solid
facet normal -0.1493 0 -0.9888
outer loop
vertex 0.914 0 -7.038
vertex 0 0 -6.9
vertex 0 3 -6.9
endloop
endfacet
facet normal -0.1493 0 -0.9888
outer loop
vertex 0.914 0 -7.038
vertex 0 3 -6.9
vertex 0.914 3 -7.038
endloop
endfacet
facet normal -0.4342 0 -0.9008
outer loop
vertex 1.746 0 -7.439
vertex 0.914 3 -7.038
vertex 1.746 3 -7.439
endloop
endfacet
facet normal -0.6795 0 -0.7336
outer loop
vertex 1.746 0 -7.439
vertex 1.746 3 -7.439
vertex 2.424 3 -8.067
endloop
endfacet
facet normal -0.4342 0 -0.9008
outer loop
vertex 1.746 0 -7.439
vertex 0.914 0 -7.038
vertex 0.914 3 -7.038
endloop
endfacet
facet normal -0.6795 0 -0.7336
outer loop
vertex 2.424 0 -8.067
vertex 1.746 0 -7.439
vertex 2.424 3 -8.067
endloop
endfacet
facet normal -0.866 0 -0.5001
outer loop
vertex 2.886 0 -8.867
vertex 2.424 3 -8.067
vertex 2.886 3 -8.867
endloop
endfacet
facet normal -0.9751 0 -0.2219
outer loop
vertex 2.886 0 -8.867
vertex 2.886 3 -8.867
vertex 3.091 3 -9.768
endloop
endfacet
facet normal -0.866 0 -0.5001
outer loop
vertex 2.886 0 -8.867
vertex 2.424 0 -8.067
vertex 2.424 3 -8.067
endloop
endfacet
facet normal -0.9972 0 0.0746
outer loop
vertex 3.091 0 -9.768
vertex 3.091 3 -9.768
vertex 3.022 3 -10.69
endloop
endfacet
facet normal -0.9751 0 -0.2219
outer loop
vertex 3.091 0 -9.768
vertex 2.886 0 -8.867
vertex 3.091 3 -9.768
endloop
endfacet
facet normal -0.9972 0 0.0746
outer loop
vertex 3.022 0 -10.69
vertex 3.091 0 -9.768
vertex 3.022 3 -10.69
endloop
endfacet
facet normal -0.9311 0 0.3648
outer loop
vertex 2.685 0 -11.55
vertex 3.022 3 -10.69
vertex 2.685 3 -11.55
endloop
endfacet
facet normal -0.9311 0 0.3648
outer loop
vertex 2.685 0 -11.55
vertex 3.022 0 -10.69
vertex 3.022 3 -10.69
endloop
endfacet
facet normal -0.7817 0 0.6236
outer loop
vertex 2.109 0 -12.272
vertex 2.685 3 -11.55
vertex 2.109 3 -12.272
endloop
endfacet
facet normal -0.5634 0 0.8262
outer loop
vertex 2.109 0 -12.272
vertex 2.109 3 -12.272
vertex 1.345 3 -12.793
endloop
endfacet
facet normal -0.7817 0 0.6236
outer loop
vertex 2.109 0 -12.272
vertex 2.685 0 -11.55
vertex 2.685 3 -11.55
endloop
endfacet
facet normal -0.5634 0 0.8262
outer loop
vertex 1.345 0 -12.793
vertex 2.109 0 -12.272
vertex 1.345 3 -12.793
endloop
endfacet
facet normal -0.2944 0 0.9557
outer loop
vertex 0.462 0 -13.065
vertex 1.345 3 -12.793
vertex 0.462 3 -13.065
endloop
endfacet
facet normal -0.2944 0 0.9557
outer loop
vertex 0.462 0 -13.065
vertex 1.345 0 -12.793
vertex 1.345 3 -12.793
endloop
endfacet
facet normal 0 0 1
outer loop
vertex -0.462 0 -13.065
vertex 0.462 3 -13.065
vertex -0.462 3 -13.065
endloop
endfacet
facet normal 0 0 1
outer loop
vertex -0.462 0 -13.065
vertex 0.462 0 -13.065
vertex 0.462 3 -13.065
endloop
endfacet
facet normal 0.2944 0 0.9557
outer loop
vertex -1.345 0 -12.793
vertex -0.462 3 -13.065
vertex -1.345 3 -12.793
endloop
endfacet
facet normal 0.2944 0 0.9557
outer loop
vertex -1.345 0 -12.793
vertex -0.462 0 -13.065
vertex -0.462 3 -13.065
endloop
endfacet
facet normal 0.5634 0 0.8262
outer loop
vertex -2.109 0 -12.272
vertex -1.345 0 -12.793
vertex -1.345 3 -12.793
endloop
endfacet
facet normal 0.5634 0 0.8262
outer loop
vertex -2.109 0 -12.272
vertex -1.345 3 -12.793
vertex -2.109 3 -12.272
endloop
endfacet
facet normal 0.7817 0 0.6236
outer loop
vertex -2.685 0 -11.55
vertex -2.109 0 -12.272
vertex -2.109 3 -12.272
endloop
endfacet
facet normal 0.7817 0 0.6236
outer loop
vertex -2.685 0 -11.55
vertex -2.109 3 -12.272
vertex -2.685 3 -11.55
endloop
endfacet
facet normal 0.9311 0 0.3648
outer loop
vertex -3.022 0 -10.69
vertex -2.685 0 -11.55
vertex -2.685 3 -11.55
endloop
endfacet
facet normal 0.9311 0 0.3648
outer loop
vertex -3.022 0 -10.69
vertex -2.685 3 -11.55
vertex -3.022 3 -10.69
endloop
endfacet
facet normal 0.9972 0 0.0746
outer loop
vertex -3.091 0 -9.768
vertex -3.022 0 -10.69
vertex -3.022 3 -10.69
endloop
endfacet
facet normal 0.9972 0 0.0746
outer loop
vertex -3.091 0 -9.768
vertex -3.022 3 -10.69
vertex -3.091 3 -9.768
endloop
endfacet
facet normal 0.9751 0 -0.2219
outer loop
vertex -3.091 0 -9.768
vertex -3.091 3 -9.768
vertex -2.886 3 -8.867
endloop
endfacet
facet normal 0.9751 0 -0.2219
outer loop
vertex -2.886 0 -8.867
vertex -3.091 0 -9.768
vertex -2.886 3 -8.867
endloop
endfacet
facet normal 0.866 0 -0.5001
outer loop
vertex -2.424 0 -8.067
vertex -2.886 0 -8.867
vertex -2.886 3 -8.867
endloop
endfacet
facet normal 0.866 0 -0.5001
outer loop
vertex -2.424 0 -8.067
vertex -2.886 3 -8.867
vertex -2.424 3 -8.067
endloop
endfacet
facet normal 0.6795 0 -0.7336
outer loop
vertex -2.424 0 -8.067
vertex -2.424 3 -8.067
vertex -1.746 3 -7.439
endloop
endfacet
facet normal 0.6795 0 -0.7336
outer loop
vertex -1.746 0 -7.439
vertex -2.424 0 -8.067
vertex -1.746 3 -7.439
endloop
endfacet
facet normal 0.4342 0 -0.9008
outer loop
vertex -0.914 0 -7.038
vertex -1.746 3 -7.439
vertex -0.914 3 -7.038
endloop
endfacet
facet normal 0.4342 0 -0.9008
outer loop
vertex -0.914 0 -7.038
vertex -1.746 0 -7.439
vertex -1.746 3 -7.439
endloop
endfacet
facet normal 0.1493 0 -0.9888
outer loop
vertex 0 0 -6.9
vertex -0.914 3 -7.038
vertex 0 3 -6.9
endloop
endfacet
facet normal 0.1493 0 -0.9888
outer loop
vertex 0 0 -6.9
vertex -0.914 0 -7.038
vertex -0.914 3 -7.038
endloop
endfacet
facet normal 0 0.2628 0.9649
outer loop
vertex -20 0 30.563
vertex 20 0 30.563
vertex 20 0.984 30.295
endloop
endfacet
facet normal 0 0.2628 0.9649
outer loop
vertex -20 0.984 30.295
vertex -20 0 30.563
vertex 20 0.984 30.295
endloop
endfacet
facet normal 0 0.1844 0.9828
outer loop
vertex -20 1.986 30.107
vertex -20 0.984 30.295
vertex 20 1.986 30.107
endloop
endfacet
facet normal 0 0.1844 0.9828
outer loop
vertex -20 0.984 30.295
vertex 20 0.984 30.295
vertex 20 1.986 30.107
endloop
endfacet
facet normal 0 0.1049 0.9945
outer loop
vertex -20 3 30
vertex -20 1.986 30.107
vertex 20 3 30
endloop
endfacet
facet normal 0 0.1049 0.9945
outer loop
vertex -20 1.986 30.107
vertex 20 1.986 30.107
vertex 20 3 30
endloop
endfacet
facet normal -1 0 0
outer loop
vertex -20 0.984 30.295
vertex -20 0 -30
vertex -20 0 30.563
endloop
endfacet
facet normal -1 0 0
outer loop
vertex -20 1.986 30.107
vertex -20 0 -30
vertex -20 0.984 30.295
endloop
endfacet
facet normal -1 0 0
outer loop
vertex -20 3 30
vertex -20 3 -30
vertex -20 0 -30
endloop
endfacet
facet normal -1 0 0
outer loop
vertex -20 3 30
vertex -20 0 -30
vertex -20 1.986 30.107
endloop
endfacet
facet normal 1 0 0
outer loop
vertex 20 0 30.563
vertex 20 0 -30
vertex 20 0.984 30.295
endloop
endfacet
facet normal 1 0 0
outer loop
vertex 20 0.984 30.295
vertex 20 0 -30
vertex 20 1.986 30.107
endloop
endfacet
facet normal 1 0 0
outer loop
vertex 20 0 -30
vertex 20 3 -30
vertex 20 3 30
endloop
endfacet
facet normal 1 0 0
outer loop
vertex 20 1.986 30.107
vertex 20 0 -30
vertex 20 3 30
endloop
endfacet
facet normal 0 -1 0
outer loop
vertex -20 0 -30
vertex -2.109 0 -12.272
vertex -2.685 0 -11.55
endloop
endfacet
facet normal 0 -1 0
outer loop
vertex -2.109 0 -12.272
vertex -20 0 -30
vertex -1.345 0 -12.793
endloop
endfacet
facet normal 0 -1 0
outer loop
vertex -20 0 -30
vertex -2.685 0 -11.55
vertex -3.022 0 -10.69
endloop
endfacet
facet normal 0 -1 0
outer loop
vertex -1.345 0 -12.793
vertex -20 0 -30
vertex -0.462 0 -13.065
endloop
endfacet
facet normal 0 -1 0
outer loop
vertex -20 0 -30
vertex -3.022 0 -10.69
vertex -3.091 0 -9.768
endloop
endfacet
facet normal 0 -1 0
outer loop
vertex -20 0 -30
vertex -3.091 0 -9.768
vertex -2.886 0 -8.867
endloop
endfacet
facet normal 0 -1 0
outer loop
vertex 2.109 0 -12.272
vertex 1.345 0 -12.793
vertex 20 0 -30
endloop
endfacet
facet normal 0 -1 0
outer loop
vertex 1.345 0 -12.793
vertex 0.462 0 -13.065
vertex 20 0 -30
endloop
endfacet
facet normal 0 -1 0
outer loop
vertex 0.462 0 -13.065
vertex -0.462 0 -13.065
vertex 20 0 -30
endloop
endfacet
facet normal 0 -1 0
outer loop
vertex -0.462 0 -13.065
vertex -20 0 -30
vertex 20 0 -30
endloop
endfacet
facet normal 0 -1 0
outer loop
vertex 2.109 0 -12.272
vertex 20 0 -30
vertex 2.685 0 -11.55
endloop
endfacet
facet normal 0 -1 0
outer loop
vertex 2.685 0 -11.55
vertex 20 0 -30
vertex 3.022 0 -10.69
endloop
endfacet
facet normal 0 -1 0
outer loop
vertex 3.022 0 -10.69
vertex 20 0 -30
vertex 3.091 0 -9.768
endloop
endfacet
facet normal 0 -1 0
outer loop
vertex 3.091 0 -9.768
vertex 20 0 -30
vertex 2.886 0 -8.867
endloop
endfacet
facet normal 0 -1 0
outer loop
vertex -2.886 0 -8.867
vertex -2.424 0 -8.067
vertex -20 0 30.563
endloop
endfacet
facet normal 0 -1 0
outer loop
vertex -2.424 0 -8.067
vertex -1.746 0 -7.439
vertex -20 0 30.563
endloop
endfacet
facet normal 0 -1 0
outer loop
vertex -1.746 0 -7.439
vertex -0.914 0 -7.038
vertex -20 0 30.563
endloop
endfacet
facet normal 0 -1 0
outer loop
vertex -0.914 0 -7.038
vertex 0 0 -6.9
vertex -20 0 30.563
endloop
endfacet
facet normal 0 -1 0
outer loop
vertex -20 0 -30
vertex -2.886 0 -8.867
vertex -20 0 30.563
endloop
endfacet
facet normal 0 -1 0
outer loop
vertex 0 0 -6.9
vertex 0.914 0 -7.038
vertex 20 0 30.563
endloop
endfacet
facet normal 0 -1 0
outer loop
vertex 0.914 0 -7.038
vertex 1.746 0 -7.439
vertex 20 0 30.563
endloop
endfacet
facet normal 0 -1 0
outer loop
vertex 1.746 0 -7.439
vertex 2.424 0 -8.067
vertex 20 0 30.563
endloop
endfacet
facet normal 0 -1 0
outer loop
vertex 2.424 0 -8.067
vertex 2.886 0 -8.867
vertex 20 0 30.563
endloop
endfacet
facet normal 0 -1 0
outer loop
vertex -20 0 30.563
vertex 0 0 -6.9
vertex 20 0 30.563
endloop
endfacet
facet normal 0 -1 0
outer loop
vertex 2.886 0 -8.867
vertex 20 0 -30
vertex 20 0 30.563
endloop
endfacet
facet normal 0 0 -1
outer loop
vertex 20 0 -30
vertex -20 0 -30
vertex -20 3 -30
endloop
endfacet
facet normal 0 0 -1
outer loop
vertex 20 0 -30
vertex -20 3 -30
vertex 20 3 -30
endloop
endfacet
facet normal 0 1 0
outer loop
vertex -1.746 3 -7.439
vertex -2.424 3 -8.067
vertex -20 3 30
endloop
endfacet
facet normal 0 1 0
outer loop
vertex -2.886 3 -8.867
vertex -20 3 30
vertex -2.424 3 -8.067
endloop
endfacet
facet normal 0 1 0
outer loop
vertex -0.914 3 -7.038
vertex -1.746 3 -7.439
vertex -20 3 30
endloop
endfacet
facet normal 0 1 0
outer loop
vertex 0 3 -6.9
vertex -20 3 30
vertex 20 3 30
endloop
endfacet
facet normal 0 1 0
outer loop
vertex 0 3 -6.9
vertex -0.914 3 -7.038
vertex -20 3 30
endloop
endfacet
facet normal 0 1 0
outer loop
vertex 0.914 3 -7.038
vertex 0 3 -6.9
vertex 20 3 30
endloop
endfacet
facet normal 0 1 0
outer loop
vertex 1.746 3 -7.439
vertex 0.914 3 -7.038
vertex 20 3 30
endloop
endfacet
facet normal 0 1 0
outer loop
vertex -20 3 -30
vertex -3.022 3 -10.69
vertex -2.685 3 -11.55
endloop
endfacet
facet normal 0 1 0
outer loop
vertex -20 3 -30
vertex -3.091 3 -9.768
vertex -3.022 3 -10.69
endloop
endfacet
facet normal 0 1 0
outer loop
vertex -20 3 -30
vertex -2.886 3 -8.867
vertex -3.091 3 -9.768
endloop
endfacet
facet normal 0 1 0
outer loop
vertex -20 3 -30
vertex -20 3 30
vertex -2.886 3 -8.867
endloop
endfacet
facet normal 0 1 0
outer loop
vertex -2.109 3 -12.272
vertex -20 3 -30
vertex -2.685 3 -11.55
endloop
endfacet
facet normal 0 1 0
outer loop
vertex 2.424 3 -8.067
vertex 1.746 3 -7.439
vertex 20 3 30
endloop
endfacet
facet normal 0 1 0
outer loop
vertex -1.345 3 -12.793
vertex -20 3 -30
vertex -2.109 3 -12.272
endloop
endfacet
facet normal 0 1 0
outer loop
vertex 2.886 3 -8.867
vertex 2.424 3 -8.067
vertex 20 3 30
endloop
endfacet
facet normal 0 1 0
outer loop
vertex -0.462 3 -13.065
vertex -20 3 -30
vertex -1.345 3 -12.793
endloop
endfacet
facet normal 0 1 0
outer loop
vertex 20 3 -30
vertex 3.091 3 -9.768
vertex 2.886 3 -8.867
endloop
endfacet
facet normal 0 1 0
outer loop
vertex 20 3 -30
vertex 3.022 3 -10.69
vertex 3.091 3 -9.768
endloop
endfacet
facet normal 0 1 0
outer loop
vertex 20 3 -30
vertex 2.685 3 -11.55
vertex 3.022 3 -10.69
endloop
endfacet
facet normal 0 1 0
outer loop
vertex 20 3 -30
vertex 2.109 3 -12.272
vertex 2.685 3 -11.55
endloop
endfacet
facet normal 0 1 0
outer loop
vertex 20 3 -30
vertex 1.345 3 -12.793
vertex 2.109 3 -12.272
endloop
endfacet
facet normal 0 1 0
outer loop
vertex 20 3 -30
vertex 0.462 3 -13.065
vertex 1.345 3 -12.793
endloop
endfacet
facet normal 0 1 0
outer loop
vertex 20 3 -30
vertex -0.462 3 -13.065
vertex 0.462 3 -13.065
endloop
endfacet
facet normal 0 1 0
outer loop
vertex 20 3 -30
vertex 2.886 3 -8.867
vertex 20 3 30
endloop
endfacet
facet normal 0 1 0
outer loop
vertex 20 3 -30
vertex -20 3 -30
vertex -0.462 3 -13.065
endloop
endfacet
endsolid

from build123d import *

# Parameters (mm, degrees)
SKETCH1_W           = 40
SKETCH1_H           = 60
SKETCH1_R           = 3.1
BOSS_EXTRUDE1_DEPTH = 3
BOSS_EXTRUDE2_DEPTH = 40


with BuildPart() as part:
    # Sketch1 → Boss-Extrude1 (new body)
    with BuildSketch(Plane(origin=(0, 0, 0), x_dir=(1, 0, 0), z_dir=(0, 1, 0))):
        Rectangle(SKETCH1_W, SKETCH1_H)
        with Locations(Location((0, 10, 0), (0, 0, 270))):
            Circle(SKETCH1_R, mode=Mode.SUBTRACT)
    extrude(amount=BOSS_EXTRUDE1_DEPTH)

    # Sketch3 → Boss-Extrude2 (add)
    with BuildSketch(Plane(origin=(20, 0, 0), x_dir=(0, 0, -1), z_dir=(1, 0, 0))):
        with BuildLine():
            Line((-30, 0), (-30.562875043, 0))
            ThreePointArc((-30.562875043, 0), (-30.190981376, 1.483028164), (-30, 3))
            Line((-30, 3), (-30, 0))
        make_face()
    extrude(amount=-BOSS_EXTRUDE2_DEPTH)


solid = part.part
